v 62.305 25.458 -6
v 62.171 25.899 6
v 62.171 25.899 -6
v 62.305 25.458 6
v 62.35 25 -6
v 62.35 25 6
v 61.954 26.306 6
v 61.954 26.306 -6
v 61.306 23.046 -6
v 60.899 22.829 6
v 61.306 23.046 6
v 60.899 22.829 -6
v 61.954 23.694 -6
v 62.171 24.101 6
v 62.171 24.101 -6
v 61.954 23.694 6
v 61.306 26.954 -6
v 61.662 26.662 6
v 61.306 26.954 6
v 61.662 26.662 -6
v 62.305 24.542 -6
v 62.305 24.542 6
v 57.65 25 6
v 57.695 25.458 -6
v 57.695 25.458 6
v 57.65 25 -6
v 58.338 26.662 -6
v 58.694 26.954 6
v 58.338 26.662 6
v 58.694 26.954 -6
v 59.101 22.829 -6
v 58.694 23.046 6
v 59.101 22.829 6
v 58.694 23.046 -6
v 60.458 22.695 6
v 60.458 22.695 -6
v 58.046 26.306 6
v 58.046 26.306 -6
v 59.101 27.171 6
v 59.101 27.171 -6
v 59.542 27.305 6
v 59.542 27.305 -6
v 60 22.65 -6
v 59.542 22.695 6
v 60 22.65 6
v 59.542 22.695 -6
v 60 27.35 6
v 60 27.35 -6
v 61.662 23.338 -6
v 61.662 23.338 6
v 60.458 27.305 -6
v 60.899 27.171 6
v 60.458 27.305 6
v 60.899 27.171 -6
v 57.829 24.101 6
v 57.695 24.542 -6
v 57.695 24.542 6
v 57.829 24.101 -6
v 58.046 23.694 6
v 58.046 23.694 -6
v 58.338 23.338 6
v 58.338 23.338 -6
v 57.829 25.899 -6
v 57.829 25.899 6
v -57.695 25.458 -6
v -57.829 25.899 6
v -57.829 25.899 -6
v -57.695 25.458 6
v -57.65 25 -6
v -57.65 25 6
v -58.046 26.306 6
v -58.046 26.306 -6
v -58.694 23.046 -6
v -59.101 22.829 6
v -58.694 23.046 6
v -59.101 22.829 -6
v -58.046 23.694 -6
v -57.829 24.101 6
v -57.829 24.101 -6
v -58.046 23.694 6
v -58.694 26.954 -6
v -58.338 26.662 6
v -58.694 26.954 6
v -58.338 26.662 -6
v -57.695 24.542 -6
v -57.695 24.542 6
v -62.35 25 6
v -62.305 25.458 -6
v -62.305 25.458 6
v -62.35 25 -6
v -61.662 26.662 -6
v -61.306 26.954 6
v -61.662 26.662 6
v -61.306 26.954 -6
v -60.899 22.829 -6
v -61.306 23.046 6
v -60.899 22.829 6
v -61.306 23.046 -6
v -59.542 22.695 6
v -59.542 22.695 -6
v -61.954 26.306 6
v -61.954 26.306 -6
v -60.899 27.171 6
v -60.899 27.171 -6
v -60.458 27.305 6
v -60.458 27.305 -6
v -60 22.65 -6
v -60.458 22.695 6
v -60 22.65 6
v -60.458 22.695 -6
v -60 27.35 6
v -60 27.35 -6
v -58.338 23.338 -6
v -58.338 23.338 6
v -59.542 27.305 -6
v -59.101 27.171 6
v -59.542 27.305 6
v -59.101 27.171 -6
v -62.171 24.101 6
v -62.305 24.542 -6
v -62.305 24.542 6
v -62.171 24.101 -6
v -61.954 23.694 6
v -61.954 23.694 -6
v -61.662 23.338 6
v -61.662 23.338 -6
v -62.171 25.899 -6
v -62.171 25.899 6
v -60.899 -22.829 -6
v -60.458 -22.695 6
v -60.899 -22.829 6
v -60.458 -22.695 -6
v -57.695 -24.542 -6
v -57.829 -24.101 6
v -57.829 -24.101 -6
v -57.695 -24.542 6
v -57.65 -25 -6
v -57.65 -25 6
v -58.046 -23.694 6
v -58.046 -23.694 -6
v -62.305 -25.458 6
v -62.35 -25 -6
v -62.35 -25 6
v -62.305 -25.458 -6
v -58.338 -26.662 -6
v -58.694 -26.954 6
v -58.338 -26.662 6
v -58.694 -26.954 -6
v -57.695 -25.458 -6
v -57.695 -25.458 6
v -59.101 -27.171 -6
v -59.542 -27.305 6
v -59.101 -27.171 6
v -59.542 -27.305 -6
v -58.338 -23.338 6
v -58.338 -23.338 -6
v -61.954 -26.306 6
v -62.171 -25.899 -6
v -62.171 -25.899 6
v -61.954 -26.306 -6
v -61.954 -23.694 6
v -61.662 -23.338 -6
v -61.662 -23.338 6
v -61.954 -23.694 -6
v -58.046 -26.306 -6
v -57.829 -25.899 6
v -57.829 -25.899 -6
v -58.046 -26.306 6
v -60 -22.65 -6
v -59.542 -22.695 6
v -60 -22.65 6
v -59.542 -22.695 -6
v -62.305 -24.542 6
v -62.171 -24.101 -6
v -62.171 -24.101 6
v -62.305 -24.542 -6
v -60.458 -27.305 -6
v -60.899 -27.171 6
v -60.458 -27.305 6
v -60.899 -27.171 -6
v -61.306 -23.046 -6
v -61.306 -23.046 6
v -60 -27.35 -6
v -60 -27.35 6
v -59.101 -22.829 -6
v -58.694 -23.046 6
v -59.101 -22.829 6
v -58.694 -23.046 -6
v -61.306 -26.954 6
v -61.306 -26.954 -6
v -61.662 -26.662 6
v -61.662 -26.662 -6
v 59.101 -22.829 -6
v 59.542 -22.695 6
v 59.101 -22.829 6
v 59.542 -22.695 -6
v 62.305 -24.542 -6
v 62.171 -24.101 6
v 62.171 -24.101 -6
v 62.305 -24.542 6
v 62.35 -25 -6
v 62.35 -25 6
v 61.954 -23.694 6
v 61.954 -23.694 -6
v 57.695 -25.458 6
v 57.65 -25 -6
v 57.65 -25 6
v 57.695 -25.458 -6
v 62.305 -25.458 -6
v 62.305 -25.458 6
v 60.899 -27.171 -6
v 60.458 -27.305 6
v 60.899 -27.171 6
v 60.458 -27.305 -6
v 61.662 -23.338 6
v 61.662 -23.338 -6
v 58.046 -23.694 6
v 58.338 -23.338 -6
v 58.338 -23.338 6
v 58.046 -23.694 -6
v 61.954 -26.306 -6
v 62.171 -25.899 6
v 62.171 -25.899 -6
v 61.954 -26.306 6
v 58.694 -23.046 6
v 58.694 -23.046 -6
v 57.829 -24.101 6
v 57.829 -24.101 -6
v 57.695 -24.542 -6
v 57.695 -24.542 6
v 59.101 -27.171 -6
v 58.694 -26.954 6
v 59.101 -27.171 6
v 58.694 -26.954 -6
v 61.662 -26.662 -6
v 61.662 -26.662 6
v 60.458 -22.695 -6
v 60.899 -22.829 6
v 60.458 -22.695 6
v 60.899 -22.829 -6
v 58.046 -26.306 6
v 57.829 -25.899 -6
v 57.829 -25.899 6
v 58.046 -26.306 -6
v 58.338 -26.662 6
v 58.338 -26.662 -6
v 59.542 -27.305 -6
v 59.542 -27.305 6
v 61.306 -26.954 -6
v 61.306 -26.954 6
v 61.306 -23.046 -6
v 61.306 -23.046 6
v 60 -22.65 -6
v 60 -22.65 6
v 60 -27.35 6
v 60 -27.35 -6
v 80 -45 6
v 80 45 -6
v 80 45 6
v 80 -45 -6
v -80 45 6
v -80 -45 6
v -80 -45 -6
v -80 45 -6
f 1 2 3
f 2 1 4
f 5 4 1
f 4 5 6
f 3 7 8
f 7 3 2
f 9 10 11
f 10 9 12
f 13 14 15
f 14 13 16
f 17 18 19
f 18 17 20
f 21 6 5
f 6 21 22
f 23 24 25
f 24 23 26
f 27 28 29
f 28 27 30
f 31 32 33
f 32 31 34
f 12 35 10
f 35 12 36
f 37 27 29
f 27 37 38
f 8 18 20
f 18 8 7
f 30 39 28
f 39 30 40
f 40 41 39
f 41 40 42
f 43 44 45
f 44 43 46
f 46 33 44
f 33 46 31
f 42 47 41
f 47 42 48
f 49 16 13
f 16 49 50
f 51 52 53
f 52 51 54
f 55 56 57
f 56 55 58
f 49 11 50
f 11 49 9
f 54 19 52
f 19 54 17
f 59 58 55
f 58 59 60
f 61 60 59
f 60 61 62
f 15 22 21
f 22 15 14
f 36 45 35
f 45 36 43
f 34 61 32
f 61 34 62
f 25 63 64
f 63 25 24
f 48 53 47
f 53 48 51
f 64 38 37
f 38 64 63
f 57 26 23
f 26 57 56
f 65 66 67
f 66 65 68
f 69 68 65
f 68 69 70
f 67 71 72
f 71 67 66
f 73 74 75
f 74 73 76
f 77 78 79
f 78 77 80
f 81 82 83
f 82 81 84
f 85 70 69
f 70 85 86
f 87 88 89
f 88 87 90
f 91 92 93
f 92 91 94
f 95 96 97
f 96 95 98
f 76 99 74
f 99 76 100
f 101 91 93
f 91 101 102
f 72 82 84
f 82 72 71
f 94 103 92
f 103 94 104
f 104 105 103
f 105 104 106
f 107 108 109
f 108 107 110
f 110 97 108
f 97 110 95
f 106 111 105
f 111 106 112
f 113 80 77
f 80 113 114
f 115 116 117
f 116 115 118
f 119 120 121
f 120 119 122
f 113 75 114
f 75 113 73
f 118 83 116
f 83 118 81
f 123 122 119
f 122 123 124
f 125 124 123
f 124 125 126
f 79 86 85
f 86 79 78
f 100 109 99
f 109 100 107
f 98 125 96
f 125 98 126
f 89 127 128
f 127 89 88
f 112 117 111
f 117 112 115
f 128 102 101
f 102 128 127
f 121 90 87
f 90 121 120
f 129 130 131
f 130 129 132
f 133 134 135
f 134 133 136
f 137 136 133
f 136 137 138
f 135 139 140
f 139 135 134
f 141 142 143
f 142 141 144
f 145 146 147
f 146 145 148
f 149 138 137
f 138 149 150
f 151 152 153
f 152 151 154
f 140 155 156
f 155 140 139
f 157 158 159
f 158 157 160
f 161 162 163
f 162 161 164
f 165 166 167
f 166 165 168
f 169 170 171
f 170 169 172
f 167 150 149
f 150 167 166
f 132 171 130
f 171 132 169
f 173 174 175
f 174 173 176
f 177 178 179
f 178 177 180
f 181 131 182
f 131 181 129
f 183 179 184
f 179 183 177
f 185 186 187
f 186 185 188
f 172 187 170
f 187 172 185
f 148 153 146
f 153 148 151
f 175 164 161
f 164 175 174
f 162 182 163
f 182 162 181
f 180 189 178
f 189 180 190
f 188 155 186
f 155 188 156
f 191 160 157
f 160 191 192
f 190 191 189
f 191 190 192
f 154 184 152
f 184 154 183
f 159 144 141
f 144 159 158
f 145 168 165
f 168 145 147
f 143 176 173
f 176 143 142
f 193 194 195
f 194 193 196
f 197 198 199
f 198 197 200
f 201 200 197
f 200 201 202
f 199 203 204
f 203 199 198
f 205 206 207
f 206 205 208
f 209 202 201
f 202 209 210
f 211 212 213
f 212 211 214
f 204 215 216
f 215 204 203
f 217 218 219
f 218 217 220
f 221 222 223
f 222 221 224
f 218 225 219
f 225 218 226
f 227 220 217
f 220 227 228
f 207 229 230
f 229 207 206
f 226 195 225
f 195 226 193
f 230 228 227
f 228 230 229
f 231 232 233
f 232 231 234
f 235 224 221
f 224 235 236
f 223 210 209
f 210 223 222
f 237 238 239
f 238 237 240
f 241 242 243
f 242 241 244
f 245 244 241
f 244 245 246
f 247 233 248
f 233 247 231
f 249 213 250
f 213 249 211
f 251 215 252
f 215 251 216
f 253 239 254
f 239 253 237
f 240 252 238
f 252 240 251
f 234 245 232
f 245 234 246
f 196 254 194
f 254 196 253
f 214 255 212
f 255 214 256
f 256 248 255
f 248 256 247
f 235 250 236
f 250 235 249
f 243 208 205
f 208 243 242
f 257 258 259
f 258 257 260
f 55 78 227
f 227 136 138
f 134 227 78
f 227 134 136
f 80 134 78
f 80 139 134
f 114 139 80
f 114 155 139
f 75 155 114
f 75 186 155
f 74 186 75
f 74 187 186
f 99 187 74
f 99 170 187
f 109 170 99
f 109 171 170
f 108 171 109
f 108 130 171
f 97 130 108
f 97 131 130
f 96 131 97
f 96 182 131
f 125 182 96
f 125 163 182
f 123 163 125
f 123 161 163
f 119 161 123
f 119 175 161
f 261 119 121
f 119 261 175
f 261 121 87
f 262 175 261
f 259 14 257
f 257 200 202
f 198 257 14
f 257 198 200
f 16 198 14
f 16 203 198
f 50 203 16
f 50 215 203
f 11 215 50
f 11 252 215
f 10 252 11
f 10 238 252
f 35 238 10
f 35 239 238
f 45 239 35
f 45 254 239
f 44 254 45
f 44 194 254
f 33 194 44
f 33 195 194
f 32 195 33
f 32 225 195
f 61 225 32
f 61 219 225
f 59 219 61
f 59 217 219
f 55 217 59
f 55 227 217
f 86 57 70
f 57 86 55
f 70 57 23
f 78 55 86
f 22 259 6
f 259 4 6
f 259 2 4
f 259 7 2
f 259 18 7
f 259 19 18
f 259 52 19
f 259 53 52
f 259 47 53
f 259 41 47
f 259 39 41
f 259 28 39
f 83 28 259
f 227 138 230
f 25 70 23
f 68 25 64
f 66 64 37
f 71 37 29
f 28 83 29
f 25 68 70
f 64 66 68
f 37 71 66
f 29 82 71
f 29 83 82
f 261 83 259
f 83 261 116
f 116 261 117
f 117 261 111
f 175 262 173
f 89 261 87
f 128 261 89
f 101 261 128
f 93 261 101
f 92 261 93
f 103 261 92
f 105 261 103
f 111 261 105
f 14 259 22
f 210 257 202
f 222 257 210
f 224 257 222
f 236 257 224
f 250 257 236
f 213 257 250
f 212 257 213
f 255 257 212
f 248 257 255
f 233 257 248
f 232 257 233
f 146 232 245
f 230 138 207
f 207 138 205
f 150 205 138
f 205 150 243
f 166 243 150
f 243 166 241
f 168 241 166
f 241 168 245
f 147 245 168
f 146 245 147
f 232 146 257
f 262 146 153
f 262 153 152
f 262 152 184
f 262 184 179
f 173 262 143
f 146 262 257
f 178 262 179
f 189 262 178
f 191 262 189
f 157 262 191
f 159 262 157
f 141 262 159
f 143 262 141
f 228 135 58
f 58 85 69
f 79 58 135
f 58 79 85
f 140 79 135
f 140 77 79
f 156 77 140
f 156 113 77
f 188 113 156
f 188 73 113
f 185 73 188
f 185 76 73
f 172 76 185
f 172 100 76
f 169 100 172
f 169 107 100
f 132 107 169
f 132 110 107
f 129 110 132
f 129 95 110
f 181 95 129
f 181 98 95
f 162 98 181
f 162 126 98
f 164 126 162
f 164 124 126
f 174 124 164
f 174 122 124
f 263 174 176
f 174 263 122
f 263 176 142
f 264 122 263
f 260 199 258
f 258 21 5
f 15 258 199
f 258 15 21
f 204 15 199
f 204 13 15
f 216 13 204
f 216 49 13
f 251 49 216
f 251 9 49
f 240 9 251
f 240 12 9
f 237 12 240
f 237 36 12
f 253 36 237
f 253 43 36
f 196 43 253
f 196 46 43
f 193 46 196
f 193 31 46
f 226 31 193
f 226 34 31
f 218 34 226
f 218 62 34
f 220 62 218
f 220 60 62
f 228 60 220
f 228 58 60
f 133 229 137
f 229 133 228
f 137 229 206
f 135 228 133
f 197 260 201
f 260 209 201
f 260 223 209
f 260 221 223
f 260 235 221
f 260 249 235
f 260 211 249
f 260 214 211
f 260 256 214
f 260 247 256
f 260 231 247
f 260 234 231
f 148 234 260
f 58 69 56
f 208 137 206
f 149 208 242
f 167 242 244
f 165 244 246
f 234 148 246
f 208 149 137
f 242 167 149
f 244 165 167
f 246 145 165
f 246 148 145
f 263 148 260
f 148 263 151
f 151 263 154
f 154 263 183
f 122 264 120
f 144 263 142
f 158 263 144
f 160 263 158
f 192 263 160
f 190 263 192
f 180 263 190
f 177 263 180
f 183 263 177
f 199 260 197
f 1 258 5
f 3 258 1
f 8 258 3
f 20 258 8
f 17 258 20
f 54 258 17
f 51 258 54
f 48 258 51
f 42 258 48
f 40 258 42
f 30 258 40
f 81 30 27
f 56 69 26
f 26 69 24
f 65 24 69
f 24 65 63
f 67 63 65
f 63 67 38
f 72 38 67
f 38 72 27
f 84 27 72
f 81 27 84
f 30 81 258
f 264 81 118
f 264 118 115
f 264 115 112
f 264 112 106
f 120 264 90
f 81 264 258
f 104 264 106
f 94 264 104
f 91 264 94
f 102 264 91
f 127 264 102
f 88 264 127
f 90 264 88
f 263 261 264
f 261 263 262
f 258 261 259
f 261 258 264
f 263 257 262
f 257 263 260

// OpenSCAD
$fn = 32;

// ----------------------------------------------------------------------
// Corner plate 160 x 90 x 12
// 4 holes, centres taken from the edge offset
// ----------------------------------------------------------------------

// --- parameters (mm) ---
plate = [160, 90, 12];  // overall size (x, y, z)
holes = 4;              // number of holes the drawing asks for
bore_d = 4.5;           // nominal hole diameter from the drawing
print_allowance = 0.2;  // clearance added for printing
edge = 20;              // hole centre offset from the plate edge

// --- derived feature positions (mm) ---
hole_d = bore_d + print_allowance;  // = 4.7   hole diameter as printed
corner_x = plate[0] / 2 - edge;     // = 60   corner hole X
corner_y = plate[1] / 2 - edge;     // = 25   corner hole Y
feature_centers = [
  [corner_x, corner_y],
  [-corner_x, corner_y],
  [-corner_x, -corner_y],
  [corner_x, -corner_y]
];   // hole centres the loop below drills

// plate outline, every hole drilled through with the same cutters
difference() {
  cube(plate, center = true);
  for (centre = feature_centers)
    translate([centre[0], centre[1], 0])
      cylinder(d = hole_d, h = plate[2] + 2, center = true);
}
